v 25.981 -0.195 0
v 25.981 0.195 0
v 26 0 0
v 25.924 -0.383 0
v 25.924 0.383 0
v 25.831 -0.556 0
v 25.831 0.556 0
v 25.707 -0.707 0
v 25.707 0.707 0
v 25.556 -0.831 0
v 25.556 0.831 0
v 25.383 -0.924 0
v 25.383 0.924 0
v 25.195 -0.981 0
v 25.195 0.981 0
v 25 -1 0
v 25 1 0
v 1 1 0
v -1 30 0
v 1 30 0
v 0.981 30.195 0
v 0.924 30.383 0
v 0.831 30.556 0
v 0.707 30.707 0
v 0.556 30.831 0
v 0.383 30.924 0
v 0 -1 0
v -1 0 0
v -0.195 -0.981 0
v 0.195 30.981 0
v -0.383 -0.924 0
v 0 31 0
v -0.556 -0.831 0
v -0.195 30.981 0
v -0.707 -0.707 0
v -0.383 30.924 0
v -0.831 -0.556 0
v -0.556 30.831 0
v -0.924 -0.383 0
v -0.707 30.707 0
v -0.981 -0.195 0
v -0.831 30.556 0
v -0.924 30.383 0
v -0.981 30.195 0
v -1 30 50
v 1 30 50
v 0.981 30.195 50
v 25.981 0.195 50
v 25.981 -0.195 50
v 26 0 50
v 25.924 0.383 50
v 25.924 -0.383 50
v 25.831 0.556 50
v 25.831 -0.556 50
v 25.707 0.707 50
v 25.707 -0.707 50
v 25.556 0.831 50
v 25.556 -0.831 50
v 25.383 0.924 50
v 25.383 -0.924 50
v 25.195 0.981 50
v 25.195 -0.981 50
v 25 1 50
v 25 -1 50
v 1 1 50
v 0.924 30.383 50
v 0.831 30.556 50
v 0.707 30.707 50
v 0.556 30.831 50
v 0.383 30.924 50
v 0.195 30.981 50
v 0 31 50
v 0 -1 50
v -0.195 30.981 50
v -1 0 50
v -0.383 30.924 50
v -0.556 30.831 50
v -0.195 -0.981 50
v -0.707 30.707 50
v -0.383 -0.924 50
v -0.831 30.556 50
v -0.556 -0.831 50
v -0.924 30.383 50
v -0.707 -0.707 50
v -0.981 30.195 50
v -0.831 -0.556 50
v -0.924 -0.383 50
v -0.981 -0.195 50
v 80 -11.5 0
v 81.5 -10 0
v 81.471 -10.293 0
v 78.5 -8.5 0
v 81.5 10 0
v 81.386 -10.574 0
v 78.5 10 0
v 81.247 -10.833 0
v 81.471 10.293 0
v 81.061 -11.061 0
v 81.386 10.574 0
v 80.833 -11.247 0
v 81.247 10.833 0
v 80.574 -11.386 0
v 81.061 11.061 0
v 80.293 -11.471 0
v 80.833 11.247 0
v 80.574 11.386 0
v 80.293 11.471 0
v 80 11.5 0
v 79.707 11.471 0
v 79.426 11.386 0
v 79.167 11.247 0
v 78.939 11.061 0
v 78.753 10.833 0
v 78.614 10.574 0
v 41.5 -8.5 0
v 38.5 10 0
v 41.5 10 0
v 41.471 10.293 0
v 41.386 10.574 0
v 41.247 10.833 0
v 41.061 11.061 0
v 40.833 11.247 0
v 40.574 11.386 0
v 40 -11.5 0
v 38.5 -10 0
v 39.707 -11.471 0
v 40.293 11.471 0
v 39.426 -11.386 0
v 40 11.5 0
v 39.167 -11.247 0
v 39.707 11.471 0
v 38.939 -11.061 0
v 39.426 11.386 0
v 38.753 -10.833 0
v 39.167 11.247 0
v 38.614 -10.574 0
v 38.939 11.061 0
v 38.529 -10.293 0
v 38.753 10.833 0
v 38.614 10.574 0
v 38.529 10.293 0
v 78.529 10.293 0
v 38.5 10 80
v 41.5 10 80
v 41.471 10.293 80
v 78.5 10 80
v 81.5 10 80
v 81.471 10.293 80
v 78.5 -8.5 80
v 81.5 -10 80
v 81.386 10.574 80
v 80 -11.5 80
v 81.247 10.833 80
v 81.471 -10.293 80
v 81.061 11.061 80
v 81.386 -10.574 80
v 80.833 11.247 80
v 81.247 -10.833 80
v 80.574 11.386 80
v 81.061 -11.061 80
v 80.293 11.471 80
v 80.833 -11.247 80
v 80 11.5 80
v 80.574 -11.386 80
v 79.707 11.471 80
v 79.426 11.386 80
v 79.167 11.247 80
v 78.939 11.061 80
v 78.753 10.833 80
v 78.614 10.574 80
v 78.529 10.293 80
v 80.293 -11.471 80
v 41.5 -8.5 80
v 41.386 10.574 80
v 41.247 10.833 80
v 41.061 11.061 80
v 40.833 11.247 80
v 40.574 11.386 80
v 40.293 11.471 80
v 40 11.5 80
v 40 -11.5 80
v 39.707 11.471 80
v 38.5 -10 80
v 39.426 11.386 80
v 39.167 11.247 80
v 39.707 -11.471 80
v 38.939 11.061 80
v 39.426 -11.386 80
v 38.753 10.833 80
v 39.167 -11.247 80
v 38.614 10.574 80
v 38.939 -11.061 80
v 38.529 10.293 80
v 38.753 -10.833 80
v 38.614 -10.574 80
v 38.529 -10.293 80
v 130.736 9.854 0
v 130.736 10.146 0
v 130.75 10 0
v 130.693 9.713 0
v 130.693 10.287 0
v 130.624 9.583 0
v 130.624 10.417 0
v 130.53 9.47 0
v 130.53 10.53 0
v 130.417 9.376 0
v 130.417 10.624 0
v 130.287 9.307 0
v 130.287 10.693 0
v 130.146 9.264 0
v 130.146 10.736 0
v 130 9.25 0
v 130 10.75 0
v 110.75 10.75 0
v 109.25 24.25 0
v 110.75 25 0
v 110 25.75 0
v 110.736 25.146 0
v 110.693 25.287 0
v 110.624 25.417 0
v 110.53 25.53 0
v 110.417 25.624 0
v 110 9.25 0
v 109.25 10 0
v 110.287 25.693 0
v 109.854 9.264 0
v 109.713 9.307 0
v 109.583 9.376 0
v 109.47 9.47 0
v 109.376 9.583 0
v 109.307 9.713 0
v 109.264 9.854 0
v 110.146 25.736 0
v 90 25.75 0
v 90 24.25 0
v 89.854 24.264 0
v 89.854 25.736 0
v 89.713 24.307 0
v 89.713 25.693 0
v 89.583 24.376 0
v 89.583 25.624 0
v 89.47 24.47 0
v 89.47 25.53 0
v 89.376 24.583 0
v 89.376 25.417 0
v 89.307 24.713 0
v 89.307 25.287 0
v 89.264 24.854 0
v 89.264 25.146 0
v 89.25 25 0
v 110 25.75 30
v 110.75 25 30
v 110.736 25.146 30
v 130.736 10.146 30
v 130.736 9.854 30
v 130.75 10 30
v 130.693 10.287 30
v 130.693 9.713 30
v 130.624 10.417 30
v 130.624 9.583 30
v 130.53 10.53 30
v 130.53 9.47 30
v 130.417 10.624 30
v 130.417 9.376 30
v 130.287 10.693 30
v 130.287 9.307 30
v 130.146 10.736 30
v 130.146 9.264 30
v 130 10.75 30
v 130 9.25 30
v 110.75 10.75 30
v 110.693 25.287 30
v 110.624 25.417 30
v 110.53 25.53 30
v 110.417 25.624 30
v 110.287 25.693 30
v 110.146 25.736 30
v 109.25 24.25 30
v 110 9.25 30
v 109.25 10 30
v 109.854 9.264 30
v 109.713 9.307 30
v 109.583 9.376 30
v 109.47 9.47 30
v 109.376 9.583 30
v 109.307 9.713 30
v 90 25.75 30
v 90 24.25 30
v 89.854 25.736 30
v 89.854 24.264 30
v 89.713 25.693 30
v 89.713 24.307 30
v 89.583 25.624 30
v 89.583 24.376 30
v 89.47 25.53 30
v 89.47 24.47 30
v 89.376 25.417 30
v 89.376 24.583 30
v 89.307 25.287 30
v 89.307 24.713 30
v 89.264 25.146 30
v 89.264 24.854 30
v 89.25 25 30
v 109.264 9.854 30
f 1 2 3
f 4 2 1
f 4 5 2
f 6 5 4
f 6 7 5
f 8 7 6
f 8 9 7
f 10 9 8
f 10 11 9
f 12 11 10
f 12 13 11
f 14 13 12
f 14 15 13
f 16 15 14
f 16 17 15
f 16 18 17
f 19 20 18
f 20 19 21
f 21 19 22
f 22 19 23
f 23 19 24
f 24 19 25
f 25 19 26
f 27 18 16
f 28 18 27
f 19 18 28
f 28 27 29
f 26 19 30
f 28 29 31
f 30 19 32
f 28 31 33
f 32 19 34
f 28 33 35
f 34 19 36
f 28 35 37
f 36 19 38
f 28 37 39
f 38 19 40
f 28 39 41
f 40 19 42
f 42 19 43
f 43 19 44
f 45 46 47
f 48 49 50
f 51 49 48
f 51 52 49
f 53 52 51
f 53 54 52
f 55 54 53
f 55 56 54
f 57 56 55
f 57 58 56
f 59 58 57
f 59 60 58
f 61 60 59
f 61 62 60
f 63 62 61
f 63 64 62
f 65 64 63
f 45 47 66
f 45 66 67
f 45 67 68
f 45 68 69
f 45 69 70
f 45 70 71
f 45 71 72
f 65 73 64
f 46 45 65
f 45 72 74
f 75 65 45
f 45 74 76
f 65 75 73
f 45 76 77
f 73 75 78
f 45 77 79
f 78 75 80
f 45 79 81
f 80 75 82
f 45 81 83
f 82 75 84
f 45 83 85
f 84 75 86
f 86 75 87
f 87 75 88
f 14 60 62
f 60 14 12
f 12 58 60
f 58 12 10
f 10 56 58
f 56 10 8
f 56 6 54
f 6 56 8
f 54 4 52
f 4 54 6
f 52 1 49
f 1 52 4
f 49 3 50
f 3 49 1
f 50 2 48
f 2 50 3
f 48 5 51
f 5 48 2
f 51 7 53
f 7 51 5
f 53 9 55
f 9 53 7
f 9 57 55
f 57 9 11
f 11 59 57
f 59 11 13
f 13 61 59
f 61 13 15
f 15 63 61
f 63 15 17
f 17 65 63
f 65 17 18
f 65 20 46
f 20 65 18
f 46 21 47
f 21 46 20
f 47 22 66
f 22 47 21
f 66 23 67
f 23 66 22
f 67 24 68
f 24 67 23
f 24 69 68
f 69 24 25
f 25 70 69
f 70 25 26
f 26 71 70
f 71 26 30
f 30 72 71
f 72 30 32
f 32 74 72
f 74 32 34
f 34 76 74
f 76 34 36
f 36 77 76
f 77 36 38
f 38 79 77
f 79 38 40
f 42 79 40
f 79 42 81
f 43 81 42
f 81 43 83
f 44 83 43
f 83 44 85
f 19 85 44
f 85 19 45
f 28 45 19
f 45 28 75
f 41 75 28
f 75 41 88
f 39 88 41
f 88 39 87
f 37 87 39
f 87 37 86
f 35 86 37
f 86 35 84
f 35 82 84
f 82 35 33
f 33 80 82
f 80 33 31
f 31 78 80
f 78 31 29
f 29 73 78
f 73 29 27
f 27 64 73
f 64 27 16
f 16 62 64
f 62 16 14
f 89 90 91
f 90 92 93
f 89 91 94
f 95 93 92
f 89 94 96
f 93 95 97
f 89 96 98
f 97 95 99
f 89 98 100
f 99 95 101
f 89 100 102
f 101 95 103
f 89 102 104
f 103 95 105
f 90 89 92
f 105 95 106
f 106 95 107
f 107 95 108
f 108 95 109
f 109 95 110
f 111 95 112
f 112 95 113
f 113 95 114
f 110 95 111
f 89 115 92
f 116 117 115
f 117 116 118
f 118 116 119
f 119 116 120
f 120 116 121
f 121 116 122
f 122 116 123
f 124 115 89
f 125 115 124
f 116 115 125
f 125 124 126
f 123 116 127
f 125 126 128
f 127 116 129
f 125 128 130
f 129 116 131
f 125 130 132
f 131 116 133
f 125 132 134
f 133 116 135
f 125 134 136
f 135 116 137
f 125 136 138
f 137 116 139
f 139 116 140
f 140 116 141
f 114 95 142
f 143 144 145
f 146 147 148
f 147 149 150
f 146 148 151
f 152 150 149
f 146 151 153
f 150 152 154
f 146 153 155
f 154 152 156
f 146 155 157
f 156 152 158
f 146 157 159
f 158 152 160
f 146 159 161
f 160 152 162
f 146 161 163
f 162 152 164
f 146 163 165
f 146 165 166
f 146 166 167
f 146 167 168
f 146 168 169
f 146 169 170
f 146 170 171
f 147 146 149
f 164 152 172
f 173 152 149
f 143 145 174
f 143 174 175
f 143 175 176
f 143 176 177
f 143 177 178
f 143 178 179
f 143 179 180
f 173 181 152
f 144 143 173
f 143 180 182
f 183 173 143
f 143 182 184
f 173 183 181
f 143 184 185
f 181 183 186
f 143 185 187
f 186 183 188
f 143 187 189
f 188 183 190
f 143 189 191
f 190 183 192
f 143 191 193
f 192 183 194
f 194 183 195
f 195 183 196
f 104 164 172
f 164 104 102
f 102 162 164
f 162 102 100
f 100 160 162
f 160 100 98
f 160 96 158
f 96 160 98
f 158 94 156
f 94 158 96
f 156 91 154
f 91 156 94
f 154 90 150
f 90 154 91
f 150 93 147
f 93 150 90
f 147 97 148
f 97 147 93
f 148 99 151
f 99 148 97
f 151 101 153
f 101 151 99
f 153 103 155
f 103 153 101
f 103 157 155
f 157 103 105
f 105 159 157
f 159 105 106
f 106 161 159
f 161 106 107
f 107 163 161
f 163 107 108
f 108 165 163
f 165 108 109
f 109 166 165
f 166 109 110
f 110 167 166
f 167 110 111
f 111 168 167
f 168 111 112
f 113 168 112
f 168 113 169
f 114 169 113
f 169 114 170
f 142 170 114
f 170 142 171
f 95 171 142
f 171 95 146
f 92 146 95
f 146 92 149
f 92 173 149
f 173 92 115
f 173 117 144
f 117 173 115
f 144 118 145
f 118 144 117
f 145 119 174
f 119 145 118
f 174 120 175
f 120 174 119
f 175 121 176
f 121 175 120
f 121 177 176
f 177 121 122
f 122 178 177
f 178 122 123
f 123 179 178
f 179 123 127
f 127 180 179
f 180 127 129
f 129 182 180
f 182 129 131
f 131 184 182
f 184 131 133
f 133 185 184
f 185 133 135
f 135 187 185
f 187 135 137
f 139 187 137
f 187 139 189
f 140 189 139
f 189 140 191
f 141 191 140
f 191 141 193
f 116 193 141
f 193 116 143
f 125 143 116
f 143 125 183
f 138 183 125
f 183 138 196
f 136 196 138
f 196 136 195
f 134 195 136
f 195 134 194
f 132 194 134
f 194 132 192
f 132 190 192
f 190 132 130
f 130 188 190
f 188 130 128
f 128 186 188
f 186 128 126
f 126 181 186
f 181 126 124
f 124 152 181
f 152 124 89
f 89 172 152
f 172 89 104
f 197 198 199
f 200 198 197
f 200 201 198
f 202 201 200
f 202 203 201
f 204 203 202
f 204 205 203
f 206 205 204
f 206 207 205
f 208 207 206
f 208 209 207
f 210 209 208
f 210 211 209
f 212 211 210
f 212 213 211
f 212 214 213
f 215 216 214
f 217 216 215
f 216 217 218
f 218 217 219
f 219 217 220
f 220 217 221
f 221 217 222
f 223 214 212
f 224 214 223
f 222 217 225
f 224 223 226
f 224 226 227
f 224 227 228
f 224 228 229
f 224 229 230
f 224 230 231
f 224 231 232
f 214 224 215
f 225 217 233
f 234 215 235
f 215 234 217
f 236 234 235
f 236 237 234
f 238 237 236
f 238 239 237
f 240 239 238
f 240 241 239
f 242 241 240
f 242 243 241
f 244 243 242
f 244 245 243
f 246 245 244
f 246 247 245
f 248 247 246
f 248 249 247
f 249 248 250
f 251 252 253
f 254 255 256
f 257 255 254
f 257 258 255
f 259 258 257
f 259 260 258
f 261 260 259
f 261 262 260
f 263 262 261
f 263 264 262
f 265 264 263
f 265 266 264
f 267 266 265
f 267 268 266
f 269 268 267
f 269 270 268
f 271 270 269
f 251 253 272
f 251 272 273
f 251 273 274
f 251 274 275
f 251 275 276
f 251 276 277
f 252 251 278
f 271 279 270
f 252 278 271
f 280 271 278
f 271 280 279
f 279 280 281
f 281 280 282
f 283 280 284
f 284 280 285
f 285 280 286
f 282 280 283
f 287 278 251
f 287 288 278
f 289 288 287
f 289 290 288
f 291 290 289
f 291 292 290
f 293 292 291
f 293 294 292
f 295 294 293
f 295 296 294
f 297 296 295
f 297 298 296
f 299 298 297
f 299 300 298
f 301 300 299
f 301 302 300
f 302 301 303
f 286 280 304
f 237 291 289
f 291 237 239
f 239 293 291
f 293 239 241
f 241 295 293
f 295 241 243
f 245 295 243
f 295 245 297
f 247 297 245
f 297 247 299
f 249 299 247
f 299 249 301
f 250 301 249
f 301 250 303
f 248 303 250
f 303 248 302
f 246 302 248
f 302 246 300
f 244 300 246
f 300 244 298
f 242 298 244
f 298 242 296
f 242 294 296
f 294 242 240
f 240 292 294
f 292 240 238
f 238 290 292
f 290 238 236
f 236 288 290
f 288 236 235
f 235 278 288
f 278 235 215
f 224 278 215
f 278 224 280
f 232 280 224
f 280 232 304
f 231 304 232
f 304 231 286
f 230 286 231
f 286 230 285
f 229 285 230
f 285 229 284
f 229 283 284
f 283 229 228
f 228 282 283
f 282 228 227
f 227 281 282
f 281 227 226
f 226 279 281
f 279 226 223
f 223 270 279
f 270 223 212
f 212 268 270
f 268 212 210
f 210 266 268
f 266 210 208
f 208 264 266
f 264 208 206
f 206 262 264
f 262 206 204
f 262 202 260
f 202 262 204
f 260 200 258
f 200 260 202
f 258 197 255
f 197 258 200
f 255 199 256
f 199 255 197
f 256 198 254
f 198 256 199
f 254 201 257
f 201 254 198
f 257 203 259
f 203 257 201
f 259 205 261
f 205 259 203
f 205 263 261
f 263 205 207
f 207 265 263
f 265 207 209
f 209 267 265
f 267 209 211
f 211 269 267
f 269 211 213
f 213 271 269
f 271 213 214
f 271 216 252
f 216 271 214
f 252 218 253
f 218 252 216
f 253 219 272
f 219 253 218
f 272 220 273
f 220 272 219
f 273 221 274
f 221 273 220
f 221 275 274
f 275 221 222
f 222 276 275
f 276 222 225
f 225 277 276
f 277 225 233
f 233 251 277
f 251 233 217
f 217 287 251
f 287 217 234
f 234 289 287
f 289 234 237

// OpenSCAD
// --------------------------------------------------------
// Parametric "Extrusion / Swept Wall" (Sheet Metal)
// --------------------------------------------------------

module swept_wall(path_points, length, thickness) {
    // The radius of our sweeping circle equals half the material thickness
    r = thickness / 2;
    
    // 1. Sweep the profile into 3D
    linear_extrude(height = length, convexity = 4) {
        
        // 2. Iterate through the coordinate points to build the profile
        for (i = [0 : len(path_points) - 2]) {
            
            // 3. The "Hull Trick": Connect consecutive points with a thick envelope
            hull() {
                translate(path_points[i])   circle(r = r, $fn = 32);
                translate(path_points[i+1]) circle(r = r, $fn = 32);
            }
        }
    }
}

// ==========================================
// Example Usage & Visualization
// ==========================================

// Define a few standard sheet metal open profiles (X, Y coordinates)
profile_L_bracket = [[0, 30], [0, 0], [25, 0]];
profile_U_channel = [[0, 20], [0, 0], [40, 0], [40, 20]];
profile_Z_bend    = [[-10, 15], [10, 15], [10, 0], [30, 0]];

// 1. Generate an L-Bracket Extrusion
color("SteelBlue")
swept_wall(
    path_points = profile_L_bracket, 
    length = 50, 
    thickness = 2
);

// 2. Generate a U-Channel (Shifted over for visibility)
color("DarkOrange")
translate([40, -10, 0])
    swept_wall(
        path_points = profile_U_channel, 
        length = 80, 
        thickness = 3
    );

// 3. Generate a Z-Bend (Shifted over)
color("MediumSeaGreen")
translate([100, 10, 0])
    swept_wall(
        path_points = profile_Z_bend, 
        length = 30, 
        thickness = 1.5
    );
